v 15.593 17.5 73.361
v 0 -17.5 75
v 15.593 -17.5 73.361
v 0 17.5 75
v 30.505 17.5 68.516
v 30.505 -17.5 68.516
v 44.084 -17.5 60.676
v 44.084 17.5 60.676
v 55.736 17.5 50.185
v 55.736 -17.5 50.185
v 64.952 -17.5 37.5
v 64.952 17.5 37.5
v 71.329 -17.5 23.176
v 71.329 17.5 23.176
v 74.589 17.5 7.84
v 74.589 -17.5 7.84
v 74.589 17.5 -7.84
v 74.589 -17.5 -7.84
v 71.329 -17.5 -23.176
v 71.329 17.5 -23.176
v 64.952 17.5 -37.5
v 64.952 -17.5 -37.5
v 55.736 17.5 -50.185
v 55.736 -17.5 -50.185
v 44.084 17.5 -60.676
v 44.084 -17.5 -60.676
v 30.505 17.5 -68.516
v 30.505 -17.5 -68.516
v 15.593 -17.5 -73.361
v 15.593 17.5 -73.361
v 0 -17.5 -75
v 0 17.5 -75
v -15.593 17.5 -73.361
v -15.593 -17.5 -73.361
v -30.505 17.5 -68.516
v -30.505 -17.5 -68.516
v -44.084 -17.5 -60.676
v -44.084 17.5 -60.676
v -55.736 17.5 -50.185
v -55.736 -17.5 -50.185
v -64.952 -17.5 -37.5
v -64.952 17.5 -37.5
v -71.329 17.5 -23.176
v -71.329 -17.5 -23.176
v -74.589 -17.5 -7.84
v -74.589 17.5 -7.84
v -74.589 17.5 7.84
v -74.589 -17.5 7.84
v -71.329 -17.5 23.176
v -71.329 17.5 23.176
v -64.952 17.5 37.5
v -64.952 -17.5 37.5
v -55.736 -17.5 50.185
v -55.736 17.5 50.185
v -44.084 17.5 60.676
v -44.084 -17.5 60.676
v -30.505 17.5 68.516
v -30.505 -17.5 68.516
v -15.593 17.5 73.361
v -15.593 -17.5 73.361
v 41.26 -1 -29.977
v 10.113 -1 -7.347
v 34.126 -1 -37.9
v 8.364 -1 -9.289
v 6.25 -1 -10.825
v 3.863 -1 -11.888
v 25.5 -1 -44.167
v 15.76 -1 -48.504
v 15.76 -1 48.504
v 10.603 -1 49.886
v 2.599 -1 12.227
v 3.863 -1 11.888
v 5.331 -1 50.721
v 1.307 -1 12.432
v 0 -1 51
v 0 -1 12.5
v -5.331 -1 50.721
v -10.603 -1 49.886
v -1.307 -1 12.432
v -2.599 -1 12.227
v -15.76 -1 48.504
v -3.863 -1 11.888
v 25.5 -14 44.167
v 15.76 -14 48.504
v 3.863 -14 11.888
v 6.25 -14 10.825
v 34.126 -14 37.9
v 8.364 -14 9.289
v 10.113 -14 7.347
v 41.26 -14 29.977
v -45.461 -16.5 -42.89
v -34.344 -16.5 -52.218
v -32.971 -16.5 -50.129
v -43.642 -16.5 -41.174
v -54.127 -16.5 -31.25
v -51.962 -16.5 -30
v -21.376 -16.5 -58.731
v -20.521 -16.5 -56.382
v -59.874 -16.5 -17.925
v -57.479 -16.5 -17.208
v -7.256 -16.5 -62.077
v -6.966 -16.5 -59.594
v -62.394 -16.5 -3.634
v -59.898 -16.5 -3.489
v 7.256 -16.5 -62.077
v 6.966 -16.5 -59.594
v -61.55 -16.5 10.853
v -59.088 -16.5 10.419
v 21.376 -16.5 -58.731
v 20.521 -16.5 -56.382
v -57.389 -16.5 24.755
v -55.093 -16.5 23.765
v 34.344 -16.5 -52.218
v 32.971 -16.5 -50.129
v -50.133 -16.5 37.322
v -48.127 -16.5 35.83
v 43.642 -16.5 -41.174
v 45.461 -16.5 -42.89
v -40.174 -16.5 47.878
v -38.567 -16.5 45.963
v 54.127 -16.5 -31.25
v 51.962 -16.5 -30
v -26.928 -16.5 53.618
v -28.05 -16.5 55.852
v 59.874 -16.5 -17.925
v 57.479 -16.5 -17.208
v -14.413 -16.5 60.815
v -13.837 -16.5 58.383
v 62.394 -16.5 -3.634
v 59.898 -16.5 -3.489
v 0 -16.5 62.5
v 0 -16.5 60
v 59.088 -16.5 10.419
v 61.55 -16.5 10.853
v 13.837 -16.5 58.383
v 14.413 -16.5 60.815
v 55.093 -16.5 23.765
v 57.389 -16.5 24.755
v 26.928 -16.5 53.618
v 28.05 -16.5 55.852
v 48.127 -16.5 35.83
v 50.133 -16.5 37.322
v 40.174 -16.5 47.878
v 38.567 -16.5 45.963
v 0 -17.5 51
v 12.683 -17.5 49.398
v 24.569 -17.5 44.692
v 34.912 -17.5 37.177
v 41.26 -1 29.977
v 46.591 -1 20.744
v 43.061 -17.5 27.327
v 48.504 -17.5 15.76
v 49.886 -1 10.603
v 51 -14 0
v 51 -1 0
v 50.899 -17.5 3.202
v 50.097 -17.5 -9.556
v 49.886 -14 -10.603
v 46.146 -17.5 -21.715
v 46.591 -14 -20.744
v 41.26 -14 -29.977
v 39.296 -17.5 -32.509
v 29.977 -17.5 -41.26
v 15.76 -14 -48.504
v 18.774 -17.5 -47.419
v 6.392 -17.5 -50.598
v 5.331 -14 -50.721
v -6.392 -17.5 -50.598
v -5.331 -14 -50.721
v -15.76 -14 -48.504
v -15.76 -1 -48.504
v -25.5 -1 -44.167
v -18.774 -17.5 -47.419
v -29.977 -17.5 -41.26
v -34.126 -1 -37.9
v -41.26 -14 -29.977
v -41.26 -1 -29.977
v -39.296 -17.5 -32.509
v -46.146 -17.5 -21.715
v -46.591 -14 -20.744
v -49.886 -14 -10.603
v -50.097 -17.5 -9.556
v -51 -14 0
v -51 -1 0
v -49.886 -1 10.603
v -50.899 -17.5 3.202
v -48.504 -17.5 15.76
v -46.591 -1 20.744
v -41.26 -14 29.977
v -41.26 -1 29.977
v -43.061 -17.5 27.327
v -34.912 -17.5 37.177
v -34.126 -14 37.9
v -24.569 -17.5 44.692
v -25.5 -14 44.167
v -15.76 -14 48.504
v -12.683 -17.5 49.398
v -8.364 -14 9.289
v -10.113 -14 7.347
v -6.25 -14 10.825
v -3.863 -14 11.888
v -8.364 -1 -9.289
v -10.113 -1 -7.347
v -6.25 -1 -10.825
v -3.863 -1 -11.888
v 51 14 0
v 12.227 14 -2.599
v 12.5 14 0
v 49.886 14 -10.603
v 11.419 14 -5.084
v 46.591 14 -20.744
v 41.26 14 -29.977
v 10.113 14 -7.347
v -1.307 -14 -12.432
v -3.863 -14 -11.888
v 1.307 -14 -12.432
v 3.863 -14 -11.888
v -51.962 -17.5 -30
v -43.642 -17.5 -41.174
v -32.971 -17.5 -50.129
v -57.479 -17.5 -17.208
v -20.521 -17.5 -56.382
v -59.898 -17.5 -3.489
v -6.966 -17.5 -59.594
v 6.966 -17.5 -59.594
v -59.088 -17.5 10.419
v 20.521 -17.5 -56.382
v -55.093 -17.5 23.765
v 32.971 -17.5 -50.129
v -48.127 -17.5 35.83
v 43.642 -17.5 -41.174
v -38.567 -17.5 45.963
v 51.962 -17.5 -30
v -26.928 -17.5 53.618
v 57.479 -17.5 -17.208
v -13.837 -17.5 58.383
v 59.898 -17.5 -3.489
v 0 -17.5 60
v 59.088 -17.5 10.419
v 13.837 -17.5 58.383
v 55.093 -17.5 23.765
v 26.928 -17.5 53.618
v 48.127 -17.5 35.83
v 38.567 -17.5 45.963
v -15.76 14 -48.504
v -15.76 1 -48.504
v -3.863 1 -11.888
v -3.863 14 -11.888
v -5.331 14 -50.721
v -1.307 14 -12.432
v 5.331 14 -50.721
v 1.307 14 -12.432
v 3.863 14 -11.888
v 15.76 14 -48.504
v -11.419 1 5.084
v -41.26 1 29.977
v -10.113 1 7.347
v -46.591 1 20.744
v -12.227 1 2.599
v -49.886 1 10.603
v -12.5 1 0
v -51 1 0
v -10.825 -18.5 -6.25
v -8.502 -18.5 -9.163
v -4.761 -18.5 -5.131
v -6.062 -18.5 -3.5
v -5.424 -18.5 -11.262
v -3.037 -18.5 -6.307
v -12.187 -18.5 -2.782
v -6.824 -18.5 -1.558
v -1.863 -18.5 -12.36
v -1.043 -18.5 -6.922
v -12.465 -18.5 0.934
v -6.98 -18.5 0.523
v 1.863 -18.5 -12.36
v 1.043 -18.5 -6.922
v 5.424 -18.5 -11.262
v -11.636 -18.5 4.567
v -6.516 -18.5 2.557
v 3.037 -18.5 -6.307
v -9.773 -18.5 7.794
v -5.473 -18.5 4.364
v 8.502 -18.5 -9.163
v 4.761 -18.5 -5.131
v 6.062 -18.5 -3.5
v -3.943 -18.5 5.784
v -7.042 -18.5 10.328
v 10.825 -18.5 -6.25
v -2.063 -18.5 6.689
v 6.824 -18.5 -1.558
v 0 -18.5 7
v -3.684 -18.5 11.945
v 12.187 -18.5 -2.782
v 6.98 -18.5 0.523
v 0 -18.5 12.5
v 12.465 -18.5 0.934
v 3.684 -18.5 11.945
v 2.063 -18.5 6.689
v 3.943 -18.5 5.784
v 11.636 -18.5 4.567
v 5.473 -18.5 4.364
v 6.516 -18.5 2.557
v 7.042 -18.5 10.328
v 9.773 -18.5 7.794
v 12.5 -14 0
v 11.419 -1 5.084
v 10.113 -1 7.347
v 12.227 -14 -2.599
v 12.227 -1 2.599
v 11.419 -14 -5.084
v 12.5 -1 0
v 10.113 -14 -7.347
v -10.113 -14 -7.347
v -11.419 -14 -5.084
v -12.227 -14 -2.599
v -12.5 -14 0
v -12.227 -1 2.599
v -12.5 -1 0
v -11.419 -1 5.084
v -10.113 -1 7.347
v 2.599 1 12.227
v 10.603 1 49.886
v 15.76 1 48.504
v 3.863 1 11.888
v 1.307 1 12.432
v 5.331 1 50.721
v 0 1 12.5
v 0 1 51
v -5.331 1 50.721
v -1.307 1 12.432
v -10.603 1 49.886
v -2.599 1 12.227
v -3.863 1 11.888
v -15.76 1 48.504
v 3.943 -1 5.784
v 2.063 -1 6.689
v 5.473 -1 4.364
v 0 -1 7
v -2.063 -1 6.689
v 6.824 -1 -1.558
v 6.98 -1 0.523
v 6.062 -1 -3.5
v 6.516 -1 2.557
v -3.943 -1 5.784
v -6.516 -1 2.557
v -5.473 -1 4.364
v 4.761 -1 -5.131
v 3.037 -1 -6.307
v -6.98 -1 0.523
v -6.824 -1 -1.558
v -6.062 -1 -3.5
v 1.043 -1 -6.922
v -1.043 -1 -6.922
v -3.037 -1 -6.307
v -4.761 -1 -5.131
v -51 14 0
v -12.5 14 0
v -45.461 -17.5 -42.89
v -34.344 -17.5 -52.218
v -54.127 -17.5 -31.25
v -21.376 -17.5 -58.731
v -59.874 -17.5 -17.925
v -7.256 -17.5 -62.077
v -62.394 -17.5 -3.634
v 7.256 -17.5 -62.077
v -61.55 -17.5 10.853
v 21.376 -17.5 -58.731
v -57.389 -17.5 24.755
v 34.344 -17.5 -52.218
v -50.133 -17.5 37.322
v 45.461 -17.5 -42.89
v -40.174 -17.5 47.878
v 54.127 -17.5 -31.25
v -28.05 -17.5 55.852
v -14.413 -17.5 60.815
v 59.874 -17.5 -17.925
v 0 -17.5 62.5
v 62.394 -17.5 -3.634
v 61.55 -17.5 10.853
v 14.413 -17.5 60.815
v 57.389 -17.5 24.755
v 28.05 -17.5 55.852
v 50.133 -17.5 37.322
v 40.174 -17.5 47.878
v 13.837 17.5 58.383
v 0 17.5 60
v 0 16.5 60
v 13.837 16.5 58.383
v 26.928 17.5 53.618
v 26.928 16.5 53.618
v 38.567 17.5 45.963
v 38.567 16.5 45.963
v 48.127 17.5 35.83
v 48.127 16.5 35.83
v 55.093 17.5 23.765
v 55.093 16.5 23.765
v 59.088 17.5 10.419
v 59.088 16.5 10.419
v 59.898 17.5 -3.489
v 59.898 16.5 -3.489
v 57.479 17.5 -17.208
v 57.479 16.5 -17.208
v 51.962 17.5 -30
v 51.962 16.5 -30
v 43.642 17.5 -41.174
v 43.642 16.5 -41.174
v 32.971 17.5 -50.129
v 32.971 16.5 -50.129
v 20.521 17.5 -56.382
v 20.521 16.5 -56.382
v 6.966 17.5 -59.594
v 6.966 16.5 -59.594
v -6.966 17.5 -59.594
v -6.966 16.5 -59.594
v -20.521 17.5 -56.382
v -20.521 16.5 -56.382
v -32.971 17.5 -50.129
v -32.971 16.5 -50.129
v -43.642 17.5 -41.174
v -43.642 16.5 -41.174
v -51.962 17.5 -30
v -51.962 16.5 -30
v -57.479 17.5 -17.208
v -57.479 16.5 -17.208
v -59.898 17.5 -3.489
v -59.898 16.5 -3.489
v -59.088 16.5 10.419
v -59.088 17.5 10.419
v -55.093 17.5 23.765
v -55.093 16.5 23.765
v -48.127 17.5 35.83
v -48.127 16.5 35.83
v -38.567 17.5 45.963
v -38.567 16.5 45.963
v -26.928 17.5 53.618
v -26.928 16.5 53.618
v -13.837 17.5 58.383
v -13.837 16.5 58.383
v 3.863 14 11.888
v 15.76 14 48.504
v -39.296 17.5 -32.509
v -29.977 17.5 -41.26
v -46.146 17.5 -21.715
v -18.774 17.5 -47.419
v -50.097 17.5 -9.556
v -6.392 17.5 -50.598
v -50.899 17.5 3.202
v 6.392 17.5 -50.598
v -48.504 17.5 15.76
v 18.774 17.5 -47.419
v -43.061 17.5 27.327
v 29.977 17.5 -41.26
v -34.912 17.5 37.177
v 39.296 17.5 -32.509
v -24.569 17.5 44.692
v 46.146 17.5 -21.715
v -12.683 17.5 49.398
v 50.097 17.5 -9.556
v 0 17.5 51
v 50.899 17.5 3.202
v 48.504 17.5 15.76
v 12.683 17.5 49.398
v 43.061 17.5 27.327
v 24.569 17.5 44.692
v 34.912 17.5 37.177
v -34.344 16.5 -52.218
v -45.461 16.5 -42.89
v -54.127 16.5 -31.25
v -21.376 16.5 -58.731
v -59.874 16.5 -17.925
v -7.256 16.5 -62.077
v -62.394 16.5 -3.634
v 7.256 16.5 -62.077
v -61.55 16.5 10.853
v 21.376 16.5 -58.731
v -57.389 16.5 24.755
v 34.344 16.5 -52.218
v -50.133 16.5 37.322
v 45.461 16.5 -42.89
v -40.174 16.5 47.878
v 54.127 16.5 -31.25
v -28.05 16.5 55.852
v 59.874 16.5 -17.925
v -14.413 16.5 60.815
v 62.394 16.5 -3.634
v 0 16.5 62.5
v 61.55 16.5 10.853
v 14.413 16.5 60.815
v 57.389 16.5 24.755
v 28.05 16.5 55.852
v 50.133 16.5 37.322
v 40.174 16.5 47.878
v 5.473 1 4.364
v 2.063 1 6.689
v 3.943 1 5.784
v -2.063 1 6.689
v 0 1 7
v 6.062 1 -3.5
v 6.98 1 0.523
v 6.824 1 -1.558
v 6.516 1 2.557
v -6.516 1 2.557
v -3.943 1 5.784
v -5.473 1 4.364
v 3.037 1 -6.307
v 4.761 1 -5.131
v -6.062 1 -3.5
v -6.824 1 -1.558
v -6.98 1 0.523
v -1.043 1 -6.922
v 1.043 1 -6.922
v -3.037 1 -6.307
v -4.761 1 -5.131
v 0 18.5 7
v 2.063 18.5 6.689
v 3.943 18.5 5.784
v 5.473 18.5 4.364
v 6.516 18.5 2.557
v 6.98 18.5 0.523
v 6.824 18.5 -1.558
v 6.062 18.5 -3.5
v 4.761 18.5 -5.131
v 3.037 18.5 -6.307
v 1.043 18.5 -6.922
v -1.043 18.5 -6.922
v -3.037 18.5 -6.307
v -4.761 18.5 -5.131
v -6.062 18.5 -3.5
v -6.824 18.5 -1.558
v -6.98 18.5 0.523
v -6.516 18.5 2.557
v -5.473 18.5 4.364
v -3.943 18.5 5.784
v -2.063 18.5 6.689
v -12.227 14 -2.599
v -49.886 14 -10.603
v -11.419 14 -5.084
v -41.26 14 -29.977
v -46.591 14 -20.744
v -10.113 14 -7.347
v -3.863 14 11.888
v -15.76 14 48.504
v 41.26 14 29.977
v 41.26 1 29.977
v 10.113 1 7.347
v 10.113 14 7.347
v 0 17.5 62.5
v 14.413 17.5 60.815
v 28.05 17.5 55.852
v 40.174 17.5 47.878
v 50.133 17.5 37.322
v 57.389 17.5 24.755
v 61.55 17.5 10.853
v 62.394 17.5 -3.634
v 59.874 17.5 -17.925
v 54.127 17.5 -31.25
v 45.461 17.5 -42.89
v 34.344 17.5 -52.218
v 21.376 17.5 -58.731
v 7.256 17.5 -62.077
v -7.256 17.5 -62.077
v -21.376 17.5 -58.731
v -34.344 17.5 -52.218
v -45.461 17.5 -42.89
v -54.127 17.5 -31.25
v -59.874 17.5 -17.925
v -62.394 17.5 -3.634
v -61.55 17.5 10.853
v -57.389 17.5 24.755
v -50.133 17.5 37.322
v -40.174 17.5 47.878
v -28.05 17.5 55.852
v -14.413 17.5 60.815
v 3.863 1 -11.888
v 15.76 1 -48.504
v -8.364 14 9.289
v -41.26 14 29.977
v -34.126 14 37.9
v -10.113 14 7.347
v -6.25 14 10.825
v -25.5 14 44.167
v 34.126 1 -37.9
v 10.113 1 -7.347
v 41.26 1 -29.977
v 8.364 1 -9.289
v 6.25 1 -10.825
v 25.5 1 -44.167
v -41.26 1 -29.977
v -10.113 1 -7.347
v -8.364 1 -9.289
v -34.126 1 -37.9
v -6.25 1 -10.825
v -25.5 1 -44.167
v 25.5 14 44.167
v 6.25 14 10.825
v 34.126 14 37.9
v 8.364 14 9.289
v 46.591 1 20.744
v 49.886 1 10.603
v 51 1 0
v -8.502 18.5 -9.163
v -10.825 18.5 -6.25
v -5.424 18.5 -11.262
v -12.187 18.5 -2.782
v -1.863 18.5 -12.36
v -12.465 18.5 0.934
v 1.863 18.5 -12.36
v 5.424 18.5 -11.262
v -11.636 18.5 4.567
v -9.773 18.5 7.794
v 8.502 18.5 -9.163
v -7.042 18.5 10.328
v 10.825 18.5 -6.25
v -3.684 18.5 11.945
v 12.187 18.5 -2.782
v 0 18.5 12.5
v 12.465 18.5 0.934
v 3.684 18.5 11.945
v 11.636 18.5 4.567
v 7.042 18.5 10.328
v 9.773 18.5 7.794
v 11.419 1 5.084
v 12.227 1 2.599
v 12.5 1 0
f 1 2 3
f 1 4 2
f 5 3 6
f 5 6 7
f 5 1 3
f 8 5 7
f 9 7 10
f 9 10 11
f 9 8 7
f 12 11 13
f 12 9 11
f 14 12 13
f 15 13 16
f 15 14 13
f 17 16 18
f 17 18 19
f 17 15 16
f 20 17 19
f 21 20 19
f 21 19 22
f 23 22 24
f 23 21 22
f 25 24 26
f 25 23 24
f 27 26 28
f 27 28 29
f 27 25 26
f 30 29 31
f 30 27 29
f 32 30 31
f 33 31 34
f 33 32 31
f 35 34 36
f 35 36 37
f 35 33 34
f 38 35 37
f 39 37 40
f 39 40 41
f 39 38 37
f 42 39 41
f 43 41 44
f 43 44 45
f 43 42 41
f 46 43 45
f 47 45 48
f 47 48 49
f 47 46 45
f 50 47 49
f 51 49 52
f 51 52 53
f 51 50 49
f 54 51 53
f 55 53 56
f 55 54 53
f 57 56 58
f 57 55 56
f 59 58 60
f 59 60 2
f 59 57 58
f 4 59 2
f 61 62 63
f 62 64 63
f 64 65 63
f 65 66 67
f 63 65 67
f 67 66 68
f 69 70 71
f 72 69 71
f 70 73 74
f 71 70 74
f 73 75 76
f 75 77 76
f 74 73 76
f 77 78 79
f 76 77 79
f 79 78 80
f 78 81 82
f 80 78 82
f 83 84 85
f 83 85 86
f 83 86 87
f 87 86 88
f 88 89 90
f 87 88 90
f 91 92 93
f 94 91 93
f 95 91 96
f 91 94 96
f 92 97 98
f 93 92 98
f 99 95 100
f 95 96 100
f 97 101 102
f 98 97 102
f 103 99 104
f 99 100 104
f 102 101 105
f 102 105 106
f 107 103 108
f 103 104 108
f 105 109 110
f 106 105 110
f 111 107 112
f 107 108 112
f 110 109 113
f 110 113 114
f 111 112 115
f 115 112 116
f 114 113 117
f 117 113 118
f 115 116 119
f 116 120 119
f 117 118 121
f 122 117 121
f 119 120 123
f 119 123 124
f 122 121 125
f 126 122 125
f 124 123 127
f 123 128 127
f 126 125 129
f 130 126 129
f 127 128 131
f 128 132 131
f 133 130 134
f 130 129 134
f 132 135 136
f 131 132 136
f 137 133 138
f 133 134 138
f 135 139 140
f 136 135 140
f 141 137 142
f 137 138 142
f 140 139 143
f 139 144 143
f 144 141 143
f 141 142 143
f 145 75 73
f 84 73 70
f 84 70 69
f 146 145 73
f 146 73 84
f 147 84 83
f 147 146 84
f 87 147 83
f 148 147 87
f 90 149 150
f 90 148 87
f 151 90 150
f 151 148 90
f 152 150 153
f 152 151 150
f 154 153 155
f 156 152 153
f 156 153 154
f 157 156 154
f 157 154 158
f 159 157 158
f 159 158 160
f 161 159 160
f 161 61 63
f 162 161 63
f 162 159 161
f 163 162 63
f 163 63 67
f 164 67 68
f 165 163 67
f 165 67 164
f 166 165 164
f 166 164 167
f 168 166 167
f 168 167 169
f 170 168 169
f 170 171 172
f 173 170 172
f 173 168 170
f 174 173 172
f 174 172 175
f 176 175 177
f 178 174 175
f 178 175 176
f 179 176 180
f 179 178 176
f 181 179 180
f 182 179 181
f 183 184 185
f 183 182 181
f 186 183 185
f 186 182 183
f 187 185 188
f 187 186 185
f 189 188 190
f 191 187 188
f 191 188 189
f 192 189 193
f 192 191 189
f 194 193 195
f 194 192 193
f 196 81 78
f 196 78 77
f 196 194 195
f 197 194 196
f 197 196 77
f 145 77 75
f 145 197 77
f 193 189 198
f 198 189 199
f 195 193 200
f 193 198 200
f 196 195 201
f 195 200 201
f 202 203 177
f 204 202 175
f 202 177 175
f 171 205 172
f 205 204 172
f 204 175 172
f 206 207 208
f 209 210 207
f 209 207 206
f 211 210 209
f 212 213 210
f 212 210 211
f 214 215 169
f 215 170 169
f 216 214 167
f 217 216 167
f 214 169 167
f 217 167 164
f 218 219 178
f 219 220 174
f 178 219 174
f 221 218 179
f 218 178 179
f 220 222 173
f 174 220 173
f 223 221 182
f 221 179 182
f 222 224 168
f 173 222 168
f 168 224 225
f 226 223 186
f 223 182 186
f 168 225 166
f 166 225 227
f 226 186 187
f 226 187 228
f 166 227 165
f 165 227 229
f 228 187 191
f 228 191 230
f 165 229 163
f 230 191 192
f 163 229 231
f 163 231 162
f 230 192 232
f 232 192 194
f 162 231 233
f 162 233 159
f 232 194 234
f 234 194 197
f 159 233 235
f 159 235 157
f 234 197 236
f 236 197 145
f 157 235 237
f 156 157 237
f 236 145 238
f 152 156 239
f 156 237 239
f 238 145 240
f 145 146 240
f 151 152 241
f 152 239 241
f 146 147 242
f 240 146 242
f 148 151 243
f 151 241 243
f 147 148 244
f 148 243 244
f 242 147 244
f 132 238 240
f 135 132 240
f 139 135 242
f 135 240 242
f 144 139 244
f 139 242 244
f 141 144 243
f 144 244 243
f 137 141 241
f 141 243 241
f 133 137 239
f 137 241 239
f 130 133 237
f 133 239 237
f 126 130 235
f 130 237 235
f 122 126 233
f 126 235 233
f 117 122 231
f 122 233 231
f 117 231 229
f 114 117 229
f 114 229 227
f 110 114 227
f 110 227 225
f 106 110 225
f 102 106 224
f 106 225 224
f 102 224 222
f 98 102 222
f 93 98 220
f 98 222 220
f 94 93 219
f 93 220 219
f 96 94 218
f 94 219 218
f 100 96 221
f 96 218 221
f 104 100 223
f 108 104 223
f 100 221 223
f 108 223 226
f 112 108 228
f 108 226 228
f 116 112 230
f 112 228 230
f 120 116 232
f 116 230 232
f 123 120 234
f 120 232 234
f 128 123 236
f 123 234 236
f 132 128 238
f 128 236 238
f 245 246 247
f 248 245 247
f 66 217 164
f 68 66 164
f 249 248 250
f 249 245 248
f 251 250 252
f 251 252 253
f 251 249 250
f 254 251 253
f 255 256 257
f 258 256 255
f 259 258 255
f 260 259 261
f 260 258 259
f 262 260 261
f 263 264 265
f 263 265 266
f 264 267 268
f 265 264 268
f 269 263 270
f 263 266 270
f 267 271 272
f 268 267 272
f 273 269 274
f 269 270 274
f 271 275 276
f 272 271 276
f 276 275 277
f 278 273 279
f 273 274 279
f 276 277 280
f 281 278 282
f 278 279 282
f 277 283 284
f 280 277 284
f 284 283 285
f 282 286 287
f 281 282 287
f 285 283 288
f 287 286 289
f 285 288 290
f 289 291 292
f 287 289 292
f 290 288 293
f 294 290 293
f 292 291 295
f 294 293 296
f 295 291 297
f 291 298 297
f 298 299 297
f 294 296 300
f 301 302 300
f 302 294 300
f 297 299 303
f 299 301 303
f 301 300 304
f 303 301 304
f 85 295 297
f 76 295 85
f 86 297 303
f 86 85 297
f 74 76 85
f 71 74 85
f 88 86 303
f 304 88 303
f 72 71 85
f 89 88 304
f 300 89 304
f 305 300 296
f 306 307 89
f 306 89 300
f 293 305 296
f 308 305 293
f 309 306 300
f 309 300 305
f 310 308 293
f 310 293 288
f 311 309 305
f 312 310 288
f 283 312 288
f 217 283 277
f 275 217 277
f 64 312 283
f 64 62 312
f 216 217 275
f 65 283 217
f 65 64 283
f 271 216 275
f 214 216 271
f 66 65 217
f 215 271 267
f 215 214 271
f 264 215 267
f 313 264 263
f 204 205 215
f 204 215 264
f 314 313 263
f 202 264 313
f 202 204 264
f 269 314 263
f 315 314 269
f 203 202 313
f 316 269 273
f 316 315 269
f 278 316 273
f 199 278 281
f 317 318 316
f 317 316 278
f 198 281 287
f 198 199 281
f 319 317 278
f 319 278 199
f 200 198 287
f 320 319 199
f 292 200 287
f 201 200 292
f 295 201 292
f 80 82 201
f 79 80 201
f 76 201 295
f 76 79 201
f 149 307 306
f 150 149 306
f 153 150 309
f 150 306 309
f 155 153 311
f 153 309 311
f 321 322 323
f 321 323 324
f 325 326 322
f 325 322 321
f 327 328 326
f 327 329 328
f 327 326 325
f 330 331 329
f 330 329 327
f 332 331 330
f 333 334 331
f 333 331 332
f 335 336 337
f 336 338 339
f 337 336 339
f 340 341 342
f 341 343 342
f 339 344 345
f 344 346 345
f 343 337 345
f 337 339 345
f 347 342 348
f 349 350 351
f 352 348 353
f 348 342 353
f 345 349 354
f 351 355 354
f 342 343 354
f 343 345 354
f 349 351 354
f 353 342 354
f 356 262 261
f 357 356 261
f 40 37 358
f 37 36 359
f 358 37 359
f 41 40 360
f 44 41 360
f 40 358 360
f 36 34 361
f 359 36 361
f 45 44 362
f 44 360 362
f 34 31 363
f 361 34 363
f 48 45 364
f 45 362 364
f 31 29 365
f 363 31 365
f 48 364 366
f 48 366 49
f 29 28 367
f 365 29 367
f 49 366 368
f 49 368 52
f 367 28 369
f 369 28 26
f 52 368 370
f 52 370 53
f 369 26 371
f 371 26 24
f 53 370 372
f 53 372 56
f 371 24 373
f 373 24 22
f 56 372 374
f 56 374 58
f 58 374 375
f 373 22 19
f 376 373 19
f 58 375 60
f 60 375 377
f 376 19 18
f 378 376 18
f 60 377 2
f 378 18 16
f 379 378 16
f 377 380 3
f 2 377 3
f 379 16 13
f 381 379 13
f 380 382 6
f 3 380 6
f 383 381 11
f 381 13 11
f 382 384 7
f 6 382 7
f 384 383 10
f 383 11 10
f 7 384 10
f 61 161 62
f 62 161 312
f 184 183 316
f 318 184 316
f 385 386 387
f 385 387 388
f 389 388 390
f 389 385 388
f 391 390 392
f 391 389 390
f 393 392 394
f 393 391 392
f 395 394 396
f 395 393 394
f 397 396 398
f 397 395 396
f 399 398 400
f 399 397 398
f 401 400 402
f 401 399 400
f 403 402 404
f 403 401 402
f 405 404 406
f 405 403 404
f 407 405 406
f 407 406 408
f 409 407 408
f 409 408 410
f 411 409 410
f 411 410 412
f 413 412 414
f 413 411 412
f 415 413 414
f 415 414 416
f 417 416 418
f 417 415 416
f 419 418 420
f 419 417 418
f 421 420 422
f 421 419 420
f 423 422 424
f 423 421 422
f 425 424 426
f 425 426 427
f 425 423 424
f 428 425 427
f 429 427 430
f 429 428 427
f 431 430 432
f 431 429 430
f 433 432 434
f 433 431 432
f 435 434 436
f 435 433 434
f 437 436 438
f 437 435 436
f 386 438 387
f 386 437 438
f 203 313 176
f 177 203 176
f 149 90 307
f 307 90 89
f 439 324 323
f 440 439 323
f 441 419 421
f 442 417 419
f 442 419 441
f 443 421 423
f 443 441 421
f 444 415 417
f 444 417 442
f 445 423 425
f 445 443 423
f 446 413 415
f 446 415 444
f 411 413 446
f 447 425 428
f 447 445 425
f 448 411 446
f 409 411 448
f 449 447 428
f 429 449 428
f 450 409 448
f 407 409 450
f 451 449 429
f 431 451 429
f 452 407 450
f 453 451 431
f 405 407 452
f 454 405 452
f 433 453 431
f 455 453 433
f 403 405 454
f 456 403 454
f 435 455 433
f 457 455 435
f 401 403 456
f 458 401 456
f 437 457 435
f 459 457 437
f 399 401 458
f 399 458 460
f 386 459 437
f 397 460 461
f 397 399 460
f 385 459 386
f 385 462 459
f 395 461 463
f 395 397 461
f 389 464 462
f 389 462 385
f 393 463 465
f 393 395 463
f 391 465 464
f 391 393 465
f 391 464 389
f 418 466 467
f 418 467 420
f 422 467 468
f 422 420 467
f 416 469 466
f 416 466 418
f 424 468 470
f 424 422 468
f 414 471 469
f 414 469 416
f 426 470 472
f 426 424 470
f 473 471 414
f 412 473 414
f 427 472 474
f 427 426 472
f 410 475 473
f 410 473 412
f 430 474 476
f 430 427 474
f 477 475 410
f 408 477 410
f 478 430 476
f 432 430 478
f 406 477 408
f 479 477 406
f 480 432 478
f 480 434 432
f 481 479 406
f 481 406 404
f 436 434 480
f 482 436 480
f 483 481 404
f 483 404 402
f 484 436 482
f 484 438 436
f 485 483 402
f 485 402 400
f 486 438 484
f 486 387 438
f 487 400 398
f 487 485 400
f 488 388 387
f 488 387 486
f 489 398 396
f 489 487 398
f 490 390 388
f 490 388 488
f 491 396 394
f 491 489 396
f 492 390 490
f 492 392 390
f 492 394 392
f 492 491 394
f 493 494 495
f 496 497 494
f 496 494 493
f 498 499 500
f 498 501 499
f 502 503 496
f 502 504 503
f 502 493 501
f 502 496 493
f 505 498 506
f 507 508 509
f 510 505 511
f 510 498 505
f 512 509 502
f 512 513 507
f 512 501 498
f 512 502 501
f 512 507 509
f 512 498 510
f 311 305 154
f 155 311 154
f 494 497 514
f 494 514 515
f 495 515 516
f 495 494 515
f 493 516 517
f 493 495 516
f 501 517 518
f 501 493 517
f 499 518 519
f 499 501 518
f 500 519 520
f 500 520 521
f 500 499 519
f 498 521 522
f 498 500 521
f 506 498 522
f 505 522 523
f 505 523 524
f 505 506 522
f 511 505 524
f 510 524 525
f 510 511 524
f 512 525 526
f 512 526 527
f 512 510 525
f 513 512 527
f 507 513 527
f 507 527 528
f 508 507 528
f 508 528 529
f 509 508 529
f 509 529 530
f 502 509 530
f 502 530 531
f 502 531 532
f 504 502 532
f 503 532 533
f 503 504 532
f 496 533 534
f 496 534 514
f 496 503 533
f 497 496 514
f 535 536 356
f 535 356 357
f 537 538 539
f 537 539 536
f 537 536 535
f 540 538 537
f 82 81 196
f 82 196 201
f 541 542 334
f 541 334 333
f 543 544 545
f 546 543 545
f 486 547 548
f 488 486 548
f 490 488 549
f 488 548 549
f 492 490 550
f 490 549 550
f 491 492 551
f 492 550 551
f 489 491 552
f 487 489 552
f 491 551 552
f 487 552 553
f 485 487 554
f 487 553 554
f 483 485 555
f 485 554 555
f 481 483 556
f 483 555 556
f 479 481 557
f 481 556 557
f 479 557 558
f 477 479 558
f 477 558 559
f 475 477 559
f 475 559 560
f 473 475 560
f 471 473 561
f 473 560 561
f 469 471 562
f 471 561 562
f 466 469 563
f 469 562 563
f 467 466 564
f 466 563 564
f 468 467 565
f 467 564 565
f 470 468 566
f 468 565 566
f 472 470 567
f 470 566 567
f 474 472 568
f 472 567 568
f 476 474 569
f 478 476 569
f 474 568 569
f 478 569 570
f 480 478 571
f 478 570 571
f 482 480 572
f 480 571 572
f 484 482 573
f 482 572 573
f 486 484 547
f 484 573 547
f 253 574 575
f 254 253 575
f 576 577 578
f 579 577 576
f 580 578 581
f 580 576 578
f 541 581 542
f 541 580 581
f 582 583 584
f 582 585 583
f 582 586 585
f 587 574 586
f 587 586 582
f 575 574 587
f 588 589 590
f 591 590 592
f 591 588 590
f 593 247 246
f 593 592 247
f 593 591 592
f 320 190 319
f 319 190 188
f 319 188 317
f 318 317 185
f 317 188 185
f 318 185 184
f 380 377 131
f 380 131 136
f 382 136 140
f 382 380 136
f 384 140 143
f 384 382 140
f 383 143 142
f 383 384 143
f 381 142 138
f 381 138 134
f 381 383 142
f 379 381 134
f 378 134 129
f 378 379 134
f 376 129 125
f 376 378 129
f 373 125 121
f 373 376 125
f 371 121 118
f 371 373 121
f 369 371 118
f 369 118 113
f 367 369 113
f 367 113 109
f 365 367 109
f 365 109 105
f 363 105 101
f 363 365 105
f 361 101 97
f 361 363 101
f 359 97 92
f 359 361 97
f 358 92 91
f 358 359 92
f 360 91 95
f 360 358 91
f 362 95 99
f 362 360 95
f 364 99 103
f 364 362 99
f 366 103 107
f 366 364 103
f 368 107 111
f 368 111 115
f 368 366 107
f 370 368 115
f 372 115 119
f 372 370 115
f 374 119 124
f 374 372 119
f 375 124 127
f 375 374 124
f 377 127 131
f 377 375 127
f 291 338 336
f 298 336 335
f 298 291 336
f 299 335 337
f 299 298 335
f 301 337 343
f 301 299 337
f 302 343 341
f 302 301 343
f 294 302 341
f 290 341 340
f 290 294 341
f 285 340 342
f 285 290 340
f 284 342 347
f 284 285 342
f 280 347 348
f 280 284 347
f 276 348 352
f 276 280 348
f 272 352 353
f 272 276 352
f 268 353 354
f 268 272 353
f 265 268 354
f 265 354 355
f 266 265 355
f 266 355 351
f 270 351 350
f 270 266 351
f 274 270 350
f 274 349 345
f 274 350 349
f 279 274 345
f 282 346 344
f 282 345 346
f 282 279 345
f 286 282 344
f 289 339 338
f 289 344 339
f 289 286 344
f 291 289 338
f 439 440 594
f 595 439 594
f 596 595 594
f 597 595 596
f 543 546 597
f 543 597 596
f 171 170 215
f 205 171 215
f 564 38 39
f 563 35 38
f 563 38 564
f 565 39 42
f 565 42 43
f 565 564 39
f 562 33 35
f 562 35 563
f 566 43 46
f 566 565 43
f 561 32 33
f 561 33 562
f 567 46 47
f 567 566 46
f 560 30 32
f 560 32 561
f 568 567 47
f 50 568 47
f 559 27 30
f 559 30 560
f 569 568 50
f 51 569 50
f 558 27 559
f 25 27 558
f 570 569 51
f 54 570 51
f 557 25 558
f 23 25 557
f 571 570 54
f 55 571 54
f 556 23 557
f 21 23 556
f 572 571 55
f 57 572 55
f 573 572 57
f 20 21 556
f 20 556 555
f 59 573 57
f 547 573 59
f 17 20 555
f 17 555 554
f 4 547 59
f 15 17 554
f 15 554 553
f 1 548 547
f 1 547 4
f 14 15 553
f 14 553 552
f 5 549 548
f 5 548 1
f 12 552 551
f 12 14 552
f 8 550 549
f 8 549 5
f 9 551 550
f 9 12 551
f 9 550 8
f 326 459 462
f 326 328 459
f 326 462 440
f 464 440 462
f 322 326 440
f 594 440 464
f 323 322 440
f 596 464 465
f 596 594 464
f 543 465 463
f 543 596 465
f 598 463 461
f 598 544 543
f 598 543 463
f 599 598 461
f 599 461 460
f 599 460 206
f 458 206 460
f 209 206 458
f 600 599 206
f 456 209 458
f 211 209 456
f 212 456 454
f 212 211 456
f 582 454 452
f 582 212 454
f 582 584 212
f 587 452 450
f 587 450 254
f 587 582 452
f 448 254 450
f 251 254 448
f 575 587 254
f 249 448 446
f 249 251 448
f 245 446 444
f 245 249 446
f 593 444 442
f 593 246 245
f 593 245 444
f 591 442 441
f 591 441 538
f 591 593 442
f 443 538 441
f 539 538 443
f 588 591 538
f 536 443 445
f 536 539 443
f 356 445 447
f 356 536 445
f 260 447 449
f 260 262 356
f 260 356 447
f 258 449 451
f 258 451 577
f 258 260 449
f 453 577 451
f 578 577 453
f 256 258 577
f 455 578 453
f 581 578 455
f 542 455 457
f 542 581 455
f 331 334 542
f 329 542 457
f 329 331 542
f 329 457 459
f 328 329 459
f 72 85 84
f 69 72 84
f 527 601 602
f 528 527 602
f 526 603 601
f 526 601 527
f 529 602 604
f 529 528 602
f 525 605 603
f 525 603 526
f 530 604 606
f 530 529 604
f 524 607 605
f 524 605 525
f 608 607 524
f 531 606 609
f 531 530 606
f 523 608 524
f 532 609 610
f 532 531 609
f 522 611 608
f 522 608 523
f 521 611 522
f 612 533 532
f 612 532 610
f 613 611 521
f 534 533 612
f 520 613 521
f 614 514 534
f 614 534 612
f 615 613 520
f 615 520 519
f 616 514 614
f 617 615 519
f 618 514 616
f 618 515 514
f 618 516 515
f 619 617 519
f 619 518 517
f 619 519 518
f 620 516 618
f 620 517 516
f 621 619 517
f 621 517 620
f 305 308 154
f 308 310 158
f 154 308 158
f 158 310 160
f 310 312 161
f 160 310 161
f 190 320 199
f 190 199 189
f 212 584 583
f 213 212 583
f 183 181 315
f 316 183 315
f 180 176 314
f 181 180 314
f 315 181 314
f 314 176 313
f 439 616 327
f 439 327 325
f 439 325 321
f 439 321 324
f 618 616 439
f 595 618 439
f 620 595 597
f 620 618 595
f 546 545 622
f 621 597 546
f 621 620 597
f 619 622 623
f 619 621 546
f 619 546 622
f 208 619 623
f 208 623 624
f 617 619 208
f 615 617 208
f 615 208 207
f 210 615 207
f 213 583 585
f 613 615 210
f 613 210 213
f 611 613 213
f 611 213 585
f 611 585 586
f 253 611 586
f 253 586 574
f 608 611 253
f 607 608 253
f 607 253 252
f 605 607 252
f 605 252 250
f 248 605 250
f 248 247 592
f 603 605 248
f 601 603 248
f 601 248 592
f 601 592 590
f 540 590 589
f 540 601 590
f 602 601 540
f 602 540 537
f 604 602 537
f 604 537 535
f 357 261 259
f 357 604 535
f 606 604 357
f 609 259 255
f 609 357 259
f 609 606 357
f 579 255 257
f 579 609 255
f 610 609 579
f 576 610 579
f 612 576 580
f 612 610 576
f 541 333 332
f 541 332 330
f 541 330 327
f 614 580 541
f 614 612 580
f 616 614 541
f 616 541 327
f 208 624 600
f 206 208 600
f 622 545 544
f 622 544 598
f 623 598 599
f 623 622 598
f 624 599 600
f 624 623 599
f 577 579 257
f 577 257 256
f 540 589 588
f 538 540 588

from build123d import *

# Parameters (mm, degrees)
SKETCH1_R           = 75
SKETCH1_R_2         = 51
BOSS_EXTRUDE1_DEPTH = 17.5
SKETCH2_R           = 12.5
SKETCH2_R_2         = 7
BOSS_EXTRUDE2_DEPTH = 18.5
BOSS_EXTRUDE3_DEPTH = 14
SKETCH6_R           = 51
BOSS_EXTRUDE6_DEPTH = 1
SKETCH7_R           = 62.5
SKETCH7_R_2         = 60
CUT_EXTRUDE1_DEPTH  = 1


with BuildPart() as part:
    # Sketch1 → Boss-Extrude1 (new, symmetric)
    with BuildSketch(Plane(origin=(0, 0, 0), x_dir=(1, 0, 0), z_dir=(0, 1, 0))):
        with Locations(Location((0, 0, 0), (0, 0, 270))):
            Circle(SKETCH1_R)
        with Locations(Location((0, 0, 0), (0, 0, 270))):
            Circle(SKETCH1_R_2, mode=Mode.SUBTRACT)
    extrude(amount=BOSS_EXTRUDE1_DEPTH, both=True)



with BuildPart() as body_2:
    # Sketch2 → Boss-Extrude2 (new, symmetric)
    with BuildSketch(Plane(origin=(0, 0, 0), x_dir=(1, 0, 0), z_dir=(0, 1, 0))):
        with Locations(Location((0, 0, 0), (0, 0, 270))):
            Circle(SKETCH2_R)
        with Locations(Location((0, 0, 0), (0, 0, 270))):
            Circle(SKETCH2_R_2, mode=Mode.SUBTRACT)
    extrude(amount=BOSS_EXTRUDE2_DEPTH, both=True)


with BuildPart() as part_1:
    add(part.part)

    add(body_2.part)  # Boss-Extrude3 merges body 2
    # Sketch3 → Boss-Extrude3 (add, symmetric)
    with BuildSketch(Plane(origin=(0, 0, 0), x_dir=(1, 0, 0), z_dir=(0, 1, 0))):
        with BuildLine():
            ThreePointArc((-12.5, 0), (-11.888206454, 3.86271243), (-10.11271243, 7.347315654))
            Line((-10.11271243, 7.347315654), (-41.259866713, 29.977047867))
            ThreePointArc((-41.259866713, 29.977047867), (-48.503882331, 15.759866713), (-51, 0))
            Line((-51, 0), (-12.5, 0))
        make_face()
        with BuildLine():
            ThreePointArc((-3.86271243, 11.888206454), (0, 12.5), (3.86271243, 11.888206454))
            Line((3.86271243, 11.888206454), (15.759866713, 48.503882331))
            ThreePointArc((15.759866713, 48.503882331), (0, 51), (-15.759866713, 48.503882331))
            Line((-15.759866713, 48.503882331), (-3.86271243, 11.888206454))
        make_face()
        with BuildLine():
            Line((41.259866713, 29.977047867), (10.11271243, 7.347315654))
            ThreePointArc((10.11271243, 7.347315654), (11.888206454, 3.86271243), (12.5, 0))
            Line((12.5, 0), (51, 0))
            ThreePointArc((51, 0), (48.503882331, 15.759866713), (41.259866713, 29.977047867))
        make_face()
        with BuildLine():
            Line((41.259866713, -29.977047867), (10.11271243, -7.347315654))
            ThreePointArc((10.11271243, -7.347315654), (7.347315654, -10.11271243), (3.86271243, -11.888206454))
            Line((3.86271243, -11.888206454), (15.759866713, -48.503882331))
            ThreePointArc((15.759866713, -48.503882331), (29.977047867, -41.259866713), (41.259866713, -29.977047867))
        make_face()
        with BuildLine():
            ThreePointArc((-3.86271243, -11.888206454), (-7.347315654, -10.11271243), (-10.11271243, -7.347315654))
            Line((-10.11271243, -7.347315654), (-41.259866713, -29.977047867))
            ThreePointArc((-41.259866713, -29.977047867), (-29.977047867, -41.259866713), (-15.759866713, -48.503882331))
            Line((-15.759866713, -48.503882331), (-3.86271243, -11.888206454))
        make_face()
    extrude(amount=BOSS_EXTRUDE3_DEPTH, both=True)

    # Sketch6 → Boss-Extrude6 (add, symmetric)
    with BuildSketch(Plane(origin=(0, 0, 0), x_dir=(1, 0, 0), z_dir=(0, 1, 0))):
        with Locations(Location((0, 0, 0), (0, 0, 72))):
            Circle(SKETCH6_R)
    extrude(amount=BOSS_EXTRUDE6_DEPTH, both=True)

    # Sketch7 → Cut-Extrude1 (cut)
    with BuildSketch(Plane(origin=(0, 17.5, 0), x_dir=(1, 0, 0), z_dir=(0, 1, 0))):
        with Locations(Location((0, 0, 0), (0, 0, 270))):
            Circle(SKETCH7_R)
        with Locations(Location((0, 0, 0), (0, 0, 270))):
            Circle(SKETCH7_R_2, mode=Mode.SUBTRACT)
    cut_extrude1 = extrude(amount=-CUT_EXTRUDE1_DEPTH, mode=Mode.SUBTRACT)

    # Mirror2: Cut-Extrude1 across plane
    add(cut_extrude1.mirror(Plane.ZX), mode=Mode.SUBTRACT)


solid = part_1.part
